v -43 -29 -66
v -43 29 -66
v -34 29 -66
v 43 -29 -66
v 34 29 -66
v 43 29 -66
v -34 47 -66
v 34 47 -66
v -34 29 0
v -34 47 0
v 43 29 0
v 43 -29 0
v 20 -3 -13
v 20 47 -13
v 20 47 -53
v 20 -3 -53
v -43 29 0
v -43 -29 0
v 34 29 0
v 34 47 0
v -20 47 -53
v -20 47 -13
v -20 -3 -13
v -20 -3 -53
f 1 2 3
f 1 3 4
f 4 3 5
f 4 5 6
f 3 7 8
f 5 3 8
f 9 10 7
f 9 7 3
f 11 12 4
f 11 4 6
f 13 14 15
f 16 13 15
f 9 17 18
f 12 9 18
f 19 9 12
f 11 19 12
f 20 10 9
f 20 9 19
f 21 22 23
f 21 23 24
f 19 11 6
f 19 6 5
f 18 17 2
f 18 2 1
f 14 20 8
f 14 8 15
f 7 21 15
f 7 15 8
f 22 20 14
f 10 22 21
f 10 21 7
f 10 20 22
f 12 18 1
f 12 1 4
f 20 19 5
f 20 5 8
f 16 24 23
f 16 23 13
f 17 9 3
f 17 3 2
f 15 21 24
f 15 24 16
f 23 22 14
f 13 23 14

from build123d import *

# Parameters (mm, degrees)
SALIENTE_EXTRUIR1_DEPTH = 66
CROQUIS2_W              = 40
CROQUIS2_H              = 40
CORTAR_EXTRUIR1_DEPTH   = 50


with BuildPart() as part:
    # Croquis1 → Saliente-Extruir1 (new body)
    with BuildSketch(Plane.XY):
        Polygon((-43, -29), (43, -29), (43, 29), (34, 29), (34, 47), (-34, 47), (-34, 29), (-43, 29), align=None)
    extrude(amount=-SALIENTE_EXTRUIR1_DEPTH)

    # Croquis2 → Cortar-Extruir1 (cut)
    with BuildSketch(Plane(origin=(0, 47, 0), x_dir=(1, 0, 0), z_dir=(0, 1, 0))):
        with Locations((0, 33)):
            Rectangle(CROQUIS2_W, CROQUIS2_H)
    extrude(amount=-CORTAR_EXTRUIR1_DEPTH, mode=Mode.SUBTRACT)


solid = part.part
